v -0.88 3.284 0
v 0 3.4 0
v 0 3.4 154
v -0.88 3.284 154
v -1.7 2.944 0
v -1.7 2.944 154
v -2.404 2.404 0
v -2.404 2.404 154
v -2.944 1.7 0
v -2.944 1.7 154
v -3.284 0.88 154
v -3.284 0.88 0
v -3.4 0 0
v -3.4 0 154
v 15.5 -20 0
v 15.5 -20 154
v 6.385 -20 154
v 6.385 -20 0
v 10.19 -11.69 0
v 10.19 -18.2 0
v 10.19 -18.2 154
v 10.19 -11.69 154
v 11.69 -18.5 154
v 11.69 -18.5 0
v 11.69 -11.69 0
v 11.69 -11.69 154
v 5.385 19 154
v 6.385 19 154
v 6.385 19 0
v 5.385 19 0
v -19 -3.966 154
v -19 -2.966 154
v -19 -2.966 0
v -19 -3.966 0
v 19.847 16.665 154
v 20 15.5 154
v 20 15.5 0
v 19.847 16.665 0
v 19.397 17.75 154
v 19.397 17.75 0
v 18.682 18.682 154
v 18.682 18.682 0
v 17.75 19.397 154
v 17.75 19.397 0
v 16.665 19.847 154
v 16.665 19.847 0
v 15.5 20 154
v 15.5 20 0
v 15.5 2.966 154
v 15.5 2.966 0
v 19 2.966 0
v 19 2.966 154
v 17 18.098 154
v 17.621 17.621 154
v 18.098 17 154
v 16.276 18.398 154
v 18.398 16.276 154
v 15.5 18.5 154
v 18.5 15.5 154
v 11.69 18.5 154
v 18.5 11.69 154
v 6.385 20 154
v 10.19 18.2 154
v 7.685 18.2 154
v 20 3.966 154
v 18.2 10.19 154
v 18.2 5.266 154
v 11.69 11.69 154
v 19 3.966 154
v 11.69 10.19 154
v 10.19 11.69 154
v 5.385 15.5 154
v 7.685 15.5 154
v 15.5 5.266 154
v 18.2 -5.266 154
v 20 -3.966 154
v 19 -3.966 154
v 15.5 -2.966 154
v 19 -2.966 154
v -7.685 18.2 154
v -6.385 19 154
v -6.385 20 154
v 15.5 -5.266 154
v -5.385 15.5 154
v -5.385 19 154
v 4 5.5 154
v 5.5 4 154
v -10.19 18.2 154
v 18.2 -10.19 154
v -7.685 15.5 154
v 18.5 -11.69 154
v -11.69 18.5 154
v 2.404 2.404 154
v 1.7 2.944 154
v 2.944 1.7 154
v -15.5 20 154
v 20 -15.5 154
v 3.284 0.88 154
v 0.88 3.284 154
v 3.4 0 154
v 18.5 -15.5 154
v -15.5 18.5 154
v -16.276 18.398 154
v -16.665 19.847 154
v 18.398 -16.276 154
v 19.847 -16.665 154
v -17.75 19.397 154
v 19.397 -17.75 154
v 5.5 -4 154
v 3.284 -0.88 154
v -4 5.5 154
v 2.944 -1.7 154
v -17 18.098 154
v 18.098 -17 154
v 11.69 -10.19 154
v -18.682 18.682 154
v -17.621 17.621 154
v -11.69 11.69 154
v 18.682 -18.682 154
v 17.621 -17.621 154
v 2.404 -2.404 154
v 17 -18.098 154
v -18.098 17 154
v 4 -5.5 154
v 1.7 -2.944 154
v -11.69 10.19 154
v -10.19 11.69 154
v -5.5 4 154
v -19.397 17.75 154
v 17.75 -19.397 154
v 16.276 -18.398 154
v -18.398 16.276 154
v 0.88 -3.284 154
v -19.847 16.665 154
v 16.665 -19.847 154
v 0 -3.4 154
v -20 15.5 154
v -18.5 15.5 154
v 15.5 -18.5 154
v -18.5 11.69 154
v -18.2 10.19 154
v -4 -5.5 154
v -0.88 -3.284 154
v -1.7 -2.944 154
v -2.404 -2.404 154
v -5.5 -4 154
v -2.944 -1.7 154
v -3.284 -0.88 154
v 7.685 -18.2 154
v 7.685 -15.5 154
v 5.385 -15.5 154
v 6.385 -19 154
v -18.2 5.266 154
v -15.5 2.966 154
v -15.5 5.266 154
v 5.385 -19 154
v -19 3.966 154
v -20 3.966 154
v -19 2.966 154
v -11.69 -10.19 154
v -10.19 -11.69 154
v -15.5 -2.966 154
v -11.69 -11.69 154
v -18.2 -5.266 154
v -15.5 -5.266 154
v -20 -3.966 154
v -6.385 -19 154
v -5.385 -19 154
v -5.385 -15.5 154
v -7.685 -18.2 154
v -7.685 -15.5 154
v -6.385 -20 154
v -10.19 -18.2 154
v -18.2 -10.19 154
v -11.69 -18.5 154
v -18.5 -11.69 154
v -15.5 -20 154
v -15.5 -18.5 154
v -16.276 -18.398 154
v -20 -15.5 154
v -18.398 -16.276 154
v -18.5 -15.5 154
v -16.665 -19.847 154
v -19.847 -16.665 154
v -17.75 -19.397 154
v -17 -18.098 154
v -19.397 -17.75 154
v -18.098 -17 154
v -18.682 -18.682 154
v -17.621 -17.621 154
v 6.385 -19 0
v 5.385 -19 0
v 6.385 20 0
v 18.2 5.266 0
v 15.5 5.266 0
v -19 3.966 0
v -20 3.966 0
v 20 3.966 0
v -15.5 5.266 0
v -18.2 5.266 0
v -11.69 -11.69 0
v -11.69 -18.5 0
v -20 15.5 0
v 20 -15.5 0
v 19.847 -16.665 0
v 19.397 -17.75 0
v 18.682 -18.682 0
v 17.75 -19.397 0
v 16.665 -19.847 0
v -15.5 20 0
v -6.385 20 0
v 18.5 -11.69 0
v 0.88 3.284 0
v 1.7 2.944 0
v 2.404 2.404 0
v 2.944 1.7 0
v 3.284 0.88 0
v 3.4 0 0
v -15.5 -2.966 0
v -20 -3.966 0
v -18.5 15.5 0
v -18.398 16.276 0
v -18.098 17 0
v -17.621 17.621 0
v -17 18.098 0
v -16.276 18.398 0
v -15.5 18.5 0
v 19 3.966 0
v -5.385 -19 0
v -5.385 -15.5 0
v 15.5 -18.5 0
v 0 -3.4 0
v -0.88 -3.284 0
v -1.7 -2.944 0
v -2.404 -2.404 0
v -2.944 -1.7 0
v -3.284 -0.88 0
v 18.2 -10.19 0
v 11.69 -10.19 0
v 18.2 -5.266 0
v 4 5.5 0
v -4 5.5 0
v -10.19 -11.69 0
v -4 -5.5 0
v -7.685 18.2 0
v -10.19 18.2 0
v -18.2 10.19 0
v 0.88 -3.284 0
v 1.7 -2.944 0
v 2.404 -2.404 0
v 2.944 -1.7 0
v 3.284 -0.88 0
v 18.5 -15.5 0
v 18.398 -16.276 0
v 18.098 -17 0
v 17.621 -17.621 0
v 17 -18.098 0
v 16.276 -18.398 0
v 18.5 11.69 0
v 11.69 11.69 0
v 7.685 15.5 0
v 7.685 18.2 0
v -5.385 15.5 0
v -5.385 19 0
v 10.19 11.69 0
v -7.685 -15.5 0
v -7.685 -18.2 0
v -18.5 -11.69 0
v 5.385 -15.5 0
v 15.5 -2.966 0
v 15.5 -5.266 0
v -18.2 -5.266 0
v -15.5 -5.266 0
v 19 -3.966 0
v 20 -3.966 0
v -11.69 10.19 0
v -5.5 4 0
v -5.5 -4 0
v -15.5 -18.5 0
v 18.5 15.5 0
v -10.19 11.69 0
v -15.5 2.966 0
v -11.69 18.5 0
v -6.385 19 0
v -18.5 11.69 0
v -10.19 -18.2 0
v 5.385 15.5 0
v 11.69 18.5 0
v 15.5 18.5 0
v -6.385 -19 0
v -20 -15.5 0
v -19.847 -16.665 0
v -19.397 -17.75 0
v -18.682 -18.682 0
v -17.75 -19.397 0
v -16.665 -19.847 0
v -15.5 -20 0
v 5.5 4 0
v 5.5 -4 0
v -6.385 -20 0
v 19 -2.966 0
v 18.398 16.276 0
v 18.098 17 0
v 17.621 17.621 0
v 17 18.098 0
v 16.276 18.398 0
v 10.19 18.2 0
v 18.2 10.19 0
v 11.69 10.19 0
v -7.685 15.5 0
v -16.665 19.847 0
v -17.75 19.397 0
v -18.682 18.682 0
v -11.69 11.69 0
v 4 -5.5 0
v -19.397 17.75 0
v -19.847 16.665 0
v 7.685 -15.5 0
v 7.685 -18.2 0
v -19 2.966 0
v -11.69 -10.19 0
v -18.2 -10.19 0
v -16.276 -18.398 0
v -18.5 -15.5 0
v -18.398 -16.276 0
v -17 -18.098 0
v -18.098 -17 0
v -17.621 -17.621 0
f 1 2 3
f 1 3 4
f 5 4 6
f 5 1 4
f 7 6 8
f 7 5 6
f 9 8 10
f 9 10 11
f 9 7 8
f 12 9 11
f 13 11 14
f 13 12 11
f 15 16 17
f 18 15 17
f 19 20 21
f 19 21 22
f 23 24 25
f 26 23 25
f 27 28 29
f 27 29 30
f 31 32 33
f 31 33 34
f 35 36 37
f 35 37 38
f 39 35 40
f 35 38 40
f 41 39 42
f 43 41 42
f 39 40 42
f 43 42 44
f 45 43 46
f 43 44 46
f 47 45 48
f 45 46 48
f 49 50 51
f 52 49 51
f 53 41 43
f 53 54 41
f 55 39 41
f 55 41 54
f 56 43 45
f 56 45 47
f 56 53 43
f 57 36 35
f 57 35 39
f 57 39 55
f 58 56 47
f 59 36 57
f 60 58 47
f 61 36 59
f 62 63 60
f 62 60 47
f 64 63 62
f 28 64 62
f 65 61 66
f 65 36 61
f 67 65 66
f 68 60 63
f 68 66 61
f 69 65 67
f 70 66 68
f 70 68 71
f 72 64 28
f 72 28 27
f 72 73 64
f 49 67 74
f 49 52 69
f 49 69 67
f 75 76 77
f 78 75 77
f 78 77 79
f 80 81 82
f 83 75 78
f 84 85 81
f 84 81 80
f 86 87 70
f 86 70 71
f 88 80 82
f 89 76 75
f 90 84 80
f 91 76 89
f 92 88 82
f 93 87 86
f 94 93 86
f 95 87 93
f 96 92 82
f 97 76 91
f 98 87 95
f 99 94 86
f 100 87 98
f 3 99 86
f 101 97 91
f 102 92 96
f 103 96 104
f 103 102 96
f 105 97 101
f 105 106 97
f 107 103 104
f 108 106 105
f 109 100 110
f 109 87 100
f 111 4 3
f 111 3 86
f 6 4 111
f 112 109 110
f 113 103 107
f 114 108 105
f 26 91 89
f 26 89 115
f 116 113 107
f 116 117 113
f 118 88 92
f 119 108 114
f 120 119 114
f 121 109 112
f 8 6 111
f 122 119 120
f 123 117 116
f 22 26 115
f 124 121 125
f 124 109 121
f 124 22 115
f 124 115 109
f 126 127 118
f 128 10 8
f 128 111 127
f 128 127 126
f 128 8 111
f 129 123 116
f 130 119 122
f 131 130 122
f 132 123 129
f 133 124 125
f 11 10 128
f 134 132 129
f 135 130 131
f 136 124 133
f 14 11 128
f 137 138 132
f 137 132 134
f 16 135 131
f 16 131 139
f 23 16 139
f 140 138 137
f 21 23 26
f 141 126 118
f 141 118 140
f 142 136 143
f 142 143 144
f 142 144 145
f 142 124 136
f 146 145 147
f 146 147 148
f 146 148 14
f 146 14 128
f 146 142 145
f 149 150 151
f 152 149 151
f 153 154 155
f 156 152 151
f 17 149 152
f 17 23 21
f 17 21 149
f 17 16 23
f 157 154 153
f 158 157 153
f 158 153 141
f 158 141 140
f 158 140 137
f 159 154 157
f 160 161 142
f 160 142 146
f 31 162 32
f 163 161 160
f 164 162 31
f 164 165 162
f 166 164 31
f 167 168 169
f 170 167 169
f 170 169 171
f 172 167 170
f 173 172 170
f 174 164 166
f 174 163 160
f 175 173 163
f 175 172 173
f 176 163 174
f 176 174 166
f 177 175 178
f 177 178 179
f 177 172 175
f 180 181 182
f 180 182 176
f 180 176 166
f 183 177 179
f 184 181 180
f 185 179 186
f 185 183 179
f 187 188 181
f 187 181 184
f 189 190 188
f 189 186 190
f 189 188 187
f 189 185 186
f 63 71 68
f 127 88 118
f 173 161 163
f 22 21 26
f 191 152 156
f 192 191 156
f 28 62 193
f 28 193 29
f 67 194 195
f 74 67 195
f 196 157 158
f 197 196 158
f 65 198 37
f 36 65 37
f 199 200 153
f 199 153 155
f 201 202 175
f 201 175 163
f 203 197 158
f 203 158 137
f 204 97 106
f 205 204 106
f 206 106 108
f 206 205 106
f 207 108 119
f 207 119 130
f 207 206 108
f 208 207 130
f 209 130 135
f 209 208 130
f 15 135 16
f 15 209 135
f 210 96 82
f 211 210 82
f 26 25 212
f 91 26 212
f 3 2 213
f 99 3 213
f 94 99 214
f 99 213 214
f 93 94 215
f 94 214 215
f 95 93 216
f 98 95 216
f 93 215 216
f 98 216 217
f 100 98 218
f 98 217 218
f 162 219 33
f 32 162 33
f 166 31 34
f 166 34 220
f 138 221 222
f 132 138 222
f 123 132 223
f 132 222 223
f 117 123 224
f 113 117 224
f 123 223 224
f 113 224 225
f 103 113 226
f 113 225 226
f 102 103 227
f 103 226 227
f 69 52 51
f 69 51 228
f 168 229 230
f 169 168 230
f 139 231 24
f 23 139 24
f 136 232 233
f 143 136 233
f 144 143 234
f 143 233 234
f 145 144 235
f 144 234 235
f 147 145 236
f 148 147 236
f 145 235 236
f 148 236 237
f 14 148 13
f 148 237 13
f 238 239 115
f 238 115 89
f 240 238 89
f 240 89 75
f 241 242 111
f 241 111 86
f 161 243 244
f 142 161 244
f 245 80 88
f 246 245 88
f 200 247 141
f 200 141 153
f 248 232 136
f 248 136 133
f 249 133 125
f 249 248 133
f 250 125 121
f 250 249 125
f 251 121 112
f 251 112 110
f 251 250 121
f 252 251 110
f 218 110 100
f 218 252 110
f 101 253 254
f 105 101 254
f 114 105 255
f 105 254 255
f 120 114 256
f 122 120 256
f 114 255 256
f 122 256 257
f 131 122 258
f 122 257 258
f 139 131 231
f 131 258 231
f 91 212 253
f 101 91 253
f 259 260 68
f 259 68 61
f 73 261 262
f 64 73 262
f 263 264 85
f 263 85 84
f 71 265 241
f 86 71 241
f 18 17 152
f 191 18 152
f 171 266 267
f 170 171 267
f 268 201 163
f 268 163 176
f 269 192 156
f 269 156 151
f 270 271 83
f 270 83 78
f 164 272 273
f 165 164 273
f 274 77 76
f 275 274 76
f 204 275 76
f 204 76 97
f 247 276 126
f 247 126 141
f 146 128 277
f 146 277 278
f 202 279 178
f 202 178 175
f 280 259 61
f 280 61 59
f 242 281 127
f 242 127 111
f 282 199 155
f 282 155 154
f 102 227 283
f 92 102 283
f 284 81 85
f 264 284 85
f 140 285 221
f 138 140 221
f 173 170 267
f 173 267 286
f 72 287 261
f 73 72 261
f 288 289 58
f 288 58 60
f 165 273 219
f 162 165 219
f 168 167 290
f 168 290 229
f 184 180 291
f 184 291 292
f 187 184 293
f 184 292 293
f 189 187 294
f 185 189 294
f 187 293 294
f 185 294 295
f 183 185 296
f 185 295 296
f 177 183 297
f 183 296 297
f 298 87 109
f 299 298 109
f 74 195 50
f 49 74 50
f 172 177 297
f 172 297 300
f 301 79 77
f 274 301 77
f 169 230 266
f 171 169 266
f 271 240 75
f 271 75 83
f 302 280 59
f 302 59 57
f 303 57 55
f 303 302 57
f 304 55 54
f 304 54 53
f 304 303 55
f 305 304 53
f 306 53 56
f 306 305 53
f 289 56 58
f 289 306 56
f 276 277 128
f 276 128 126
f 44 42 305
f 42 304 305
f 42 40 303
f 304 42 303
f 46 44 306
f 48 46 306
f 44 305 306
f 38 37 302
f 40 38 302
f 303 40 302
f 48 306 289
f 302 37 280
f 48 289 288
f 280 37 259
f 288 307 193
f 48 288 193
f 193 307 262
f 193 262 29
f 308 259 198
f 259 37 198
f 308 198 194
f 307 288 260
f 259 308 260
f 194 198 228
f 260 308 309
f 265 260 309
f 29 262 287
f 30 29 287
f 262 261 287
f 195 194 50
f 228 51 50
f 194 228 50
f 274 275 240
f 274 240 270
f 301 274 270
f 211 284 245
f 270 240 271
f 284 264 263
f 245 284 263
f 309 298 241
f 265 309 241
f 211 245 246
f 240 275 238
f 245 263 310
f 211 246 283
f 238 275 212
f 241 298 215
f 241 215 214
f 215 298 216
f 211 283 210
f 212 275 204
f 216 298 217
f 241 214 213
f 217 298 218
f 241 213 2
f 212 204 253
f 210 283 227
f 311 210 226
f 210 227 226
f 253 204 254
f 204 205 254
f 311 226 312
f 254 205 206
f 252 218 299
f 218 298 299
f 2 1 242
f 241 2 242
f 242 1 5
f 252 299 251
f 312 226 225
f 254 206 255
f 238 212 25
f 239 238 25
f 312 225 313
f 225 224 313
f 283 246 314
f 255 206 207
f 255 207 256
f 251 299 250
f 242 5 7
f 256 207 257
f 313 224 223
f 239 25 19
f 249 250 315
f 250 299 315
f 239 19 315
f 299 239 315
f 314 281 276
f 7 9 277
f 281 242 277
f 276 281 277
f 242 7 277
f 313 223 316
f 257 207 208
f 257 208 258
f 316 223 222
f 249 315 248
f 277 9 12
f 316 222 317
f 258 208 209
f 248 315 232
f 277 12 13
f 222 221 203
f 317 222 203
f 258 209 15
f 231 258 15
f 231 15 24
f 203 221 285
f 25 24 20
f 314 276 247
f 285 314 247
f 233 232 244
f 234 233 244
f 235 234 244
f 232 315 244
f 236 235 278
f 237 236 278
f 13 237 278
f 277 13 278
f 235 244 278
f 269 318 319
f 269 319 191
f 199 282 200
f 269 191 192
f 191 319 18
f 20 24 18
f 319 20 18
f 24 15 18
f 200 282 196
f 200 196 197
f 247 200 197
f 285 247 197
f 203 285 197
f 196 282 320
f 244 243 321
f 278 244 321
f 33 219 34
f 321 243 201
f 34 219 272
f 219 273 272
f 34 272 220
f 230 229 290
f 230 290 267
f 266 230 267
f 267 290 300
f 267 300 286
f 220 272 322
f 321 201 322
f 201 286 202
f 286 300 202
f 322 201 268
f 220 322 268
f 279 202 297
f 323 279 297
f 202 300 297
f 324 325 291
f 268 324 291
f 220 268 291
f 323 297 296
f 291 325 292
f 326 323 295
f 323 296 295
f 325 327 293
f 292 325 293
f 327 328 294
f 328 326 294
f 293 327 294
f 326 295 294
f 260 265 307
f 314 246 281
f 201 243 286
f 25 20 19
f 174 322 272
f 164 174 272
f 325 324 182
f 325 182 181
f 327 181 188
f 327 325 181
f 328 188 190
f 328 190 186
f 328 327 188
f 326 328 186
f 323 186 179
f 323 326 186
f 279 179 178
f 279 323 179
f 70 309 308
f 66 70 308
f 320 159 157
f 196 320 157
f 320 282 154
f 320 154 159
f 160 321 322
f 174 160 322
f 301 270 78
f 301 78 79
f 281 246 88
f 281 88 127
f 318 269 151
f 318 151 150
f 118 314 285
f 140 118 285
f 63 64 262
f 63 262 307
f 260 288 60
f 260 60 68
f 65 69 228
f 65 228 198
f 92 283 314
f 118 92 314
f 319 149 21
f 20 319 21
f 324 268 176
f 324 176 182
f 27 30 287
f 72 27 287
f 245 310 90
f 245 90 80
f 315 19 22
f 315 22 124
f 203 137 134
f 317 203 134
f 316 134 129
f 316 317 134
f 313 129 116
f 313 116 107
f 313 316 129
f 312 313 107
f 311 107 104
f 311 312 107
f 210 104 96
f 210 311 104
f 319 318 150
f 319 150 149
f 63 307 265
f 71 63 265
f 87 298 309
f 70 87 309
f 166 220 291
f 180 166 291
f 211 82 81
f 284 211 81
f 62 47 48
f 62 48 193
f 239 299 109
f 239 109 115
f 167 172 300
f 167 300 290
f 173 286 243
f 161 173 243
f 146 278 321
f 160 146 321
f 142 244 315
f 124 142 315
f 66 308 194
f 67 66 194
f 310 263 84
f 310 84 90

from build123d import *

# Parameters (mm, degrees)
BOSS_EXTRUDE1_DEPTH  = 154
MIRROR3_COPY_1_DEPTH = 154
MIRROR3_COPY_2_DEPTH = 154


with BuildPart() as part:
    # Sketch1 → Boss-Extrude1 (new body)
    with BuildSketch(Plane.XY):
        with BuildLine():
            Line((3.4, 0), (5.5, 0))
            Line((5.5, 0), (5.5, 4))
            Line((5.5, 4), (11.69, 10.19))
            Line((11.69, 10.19), (18.2, 10.19))
            Line((18.2, 10.19), (18.2, 5.265595036))
            Line((18.2, 5.265595036), (15.5, 5.265595036))
            Line((15.5, 5.265595036), (15.5, 2.965595036))
            Line((15.5, 2.965595036), (19, 2.965595036))
            Line((19, 2.965595036), (19, 3.965595036))
            Line((19, 3.965595036), (20, 3.965595036))
            Line((20, 3.965595036), (20, 15.5))
            ThreePointArc((20, 15.5), (18.681980515, 18.681980515), (15.5, 20))
            Line((15.5, 20), (6.385304712, 20))
            Line((6.385304712, 20), (6.385304712, 19))
            Line((6.385304712, 19), (5.385304712, 19))
            Line((5.385304712, 19), (5.385304712, 15.5))
            Line((5.385304712, 15.5), (7.685304712, 15.5))
            Line((7.685304712, 15.5), (7.685304712, 18.2))
            Line((7.685304712, 18.2), (10.19, 18.2))
            Line((10.19, 18.2), (10.19, 11.69))
            Line((10.19, 11.69), (4, 5.5))
            Line((4, 5.5), (0, 5.5))
            Line((0, 5.5), (0, 3.4))
            ThreePointArc((0, 3.4), (2.404163056, 2.404163056), (3.4, 0))
        make_face()
        with BuildLine():
            Line((18.5, 11.69), (18.5, 15.5))
            ThreePointArc((18.5, 15.5), (17.621320344, 17.621320344), (15.5, 18.5))
            Line((15.5, 18.5), (11.69, 18.5))
            Line((11.69, 18.5), (11.69, 11.69))
            Line((11.69, 11.69), (18.5, 11.69))
        make_face(mode=Mode.SUBTRACT)
    boss_extrude1 = extrude(amount=BOSS_EXTRUDE1_DEPTH)

    # Mirror1: Boss-Extrude1 across plane
    add(boss_extrude1.mirror(Plane.ZX))

    # Mirror2: Boss-Extrude1 across plane
    add(boss_extrude1.mirror(Plane(origin=(0, 0, 0), x_dir=(0, 0, 1), z_dir=(1, 0, 0))))

    # Mirror3 copy 1 sketch → Mirror3 copy 1 (add)
    with BuildSketch(Plane(origin=(0, 0, 0), x_dir=(-1, 0, 0), z_dir=(0, 0, 1))):
        with BuildLine():
            Line((3.4, 0), (5.5, 0))
            Line((5.5, 0), (5.5, 4))
            Line((5.5, 4), (11.69, 10.19))
            Line((11.69, 10.19), (18.2, 10.19))
            Line((18.2, 10.19), (18.2, 5.265595036))
            Line((18.2, 5.265595036), (15.5, 5.265595036))
            Line((15.5, 5.265595036), (15.5, 2.965595036))
            Line((15.5, 2.965595036), (19, 2.965595036))
            Line((19, 2.965595036), (19, 3.965595036))
            Line((19, 3.965595036), (20, 3.965595036))
            Line((20, 3.965595036), (20, 15.5))
            ThreePointArc((20, 15.5), (18.681980515, 18.681980515), (15.5, 20))
            Line((15.5, 20), (6.385304712, 20))
            Line((6.385304712, 20), (6.385304712, 19))
            Line((6.385304712, 19), (5.385304712, 19))
            Line((5.385304712, 19), (5.385304712, 15.5))
            Line((5.385304712, 15.5), (7.685304712, 15.5))
            Line((7.685304712, 15.5), (7.685304712, 18.2))
            Line((7.685304712, 18.2), (10.19, 18.2))
            Line((10.19, 18.2), (10.19, 11.69))
            Line((10.19, 11.69), (4, 5.5))
            Line((4, 5.5), (0, 5.5))
            Line((0, 5.5), (0, 3.4))
            ThreePointArc((0, 3.4), (2.404163056, 2.404163056), (3.4, 0))
        make_face()
        with BuildLine():
            Line((18.5, 11.69), (18.5, 15.5))
            ThreePointArc((18.5, 15.5), (17.621320344, 17.621320344), (15.5, 18.5))
            Line((15.5, 18.5), (11.69, 18.5))
            Line((11.69, 18.5), (11.69, 11.69))
            Line((11.69, 11.69), (18.5, 11.69))
        make_face(mode=Mode.SUBTRACT)
    extrude(amount=MIRROR3_COPY_1_DEPTH)

    # Mirror3 copy 2 sketch → Mirror3 copy 2 (add)
    with BuildSketch(Plane.XY):
        with BuildLine():
            Line((3.4, 0), (5.5, 0))
            Line((5.5, 0), (5.5, -4))
            Line((5.5, -4), (11.69, -10.19))
            Line((11.69, -10.19), (18.2, -10.19))
            Line((18.2, -10.19), (18.2, -5.265595036))
            Line((18.2, -5.265595036), (15.5, -5.265595036))
            Line((15.5, -5.265595036), (15.5, -2.965595036))
            Line((15.5, -2.965595036), (19, -2.965595036))
            Line((19, -2.965595036), (19, -3.965595036))
            Line((19, -3.965595036), (20, -3.965595036))
            Line((20, -3.965595036), (20, -15.5))
            ThreePointArc((20, -15.5), (18.681980515, -18.681980515), (15.5, -20))
            Line((15.5, -20), (6.385304712, -20))
            Line((6.385304712, -20), (6.385304712, -19))
            Line((6.385304712, -19), (5.385304712, -19))
            Line((5.385304712, -19), (5.385304712, -15.5))
            Line((5.385304712, -15.5), (7.685304712, -15.5))
            Line((7.685304712, -15.5), (7.685304712, -18.2))
            Line((7.685304712, -18.2), (10.19, -18.2))
            Line((10.19, -18.2), (10.19, -11.69))
            Line((10.19, -11.69), (4, -5.5))
            Line((4, -5.5), (0, -5.5))
            Line((0, -5.5), (0, -3.4))
            ThreePointArc((0, -3.4), (2.404163056, -2.404163056), (3.4, 0))
        make_face()
        with BuildLine():
            Line((18.5, -11.69), (18.5, -15.5))
            ThreePointArc((18.5, -15.5), (17.621320344, -17.621320344), (15.5, -18.5))
            Line((15.5, -18.5), (11.69, -18.5))
            Line((11.69, -18.5), (11.69, -11.69))
            Line((11.69, -11.69), (18.5, -11.69))
        make_face(mode=Mode.SUBTRACT)
    extrude(amount=MIRROR3_COPY_2_DEPTH)


solid = part.part
